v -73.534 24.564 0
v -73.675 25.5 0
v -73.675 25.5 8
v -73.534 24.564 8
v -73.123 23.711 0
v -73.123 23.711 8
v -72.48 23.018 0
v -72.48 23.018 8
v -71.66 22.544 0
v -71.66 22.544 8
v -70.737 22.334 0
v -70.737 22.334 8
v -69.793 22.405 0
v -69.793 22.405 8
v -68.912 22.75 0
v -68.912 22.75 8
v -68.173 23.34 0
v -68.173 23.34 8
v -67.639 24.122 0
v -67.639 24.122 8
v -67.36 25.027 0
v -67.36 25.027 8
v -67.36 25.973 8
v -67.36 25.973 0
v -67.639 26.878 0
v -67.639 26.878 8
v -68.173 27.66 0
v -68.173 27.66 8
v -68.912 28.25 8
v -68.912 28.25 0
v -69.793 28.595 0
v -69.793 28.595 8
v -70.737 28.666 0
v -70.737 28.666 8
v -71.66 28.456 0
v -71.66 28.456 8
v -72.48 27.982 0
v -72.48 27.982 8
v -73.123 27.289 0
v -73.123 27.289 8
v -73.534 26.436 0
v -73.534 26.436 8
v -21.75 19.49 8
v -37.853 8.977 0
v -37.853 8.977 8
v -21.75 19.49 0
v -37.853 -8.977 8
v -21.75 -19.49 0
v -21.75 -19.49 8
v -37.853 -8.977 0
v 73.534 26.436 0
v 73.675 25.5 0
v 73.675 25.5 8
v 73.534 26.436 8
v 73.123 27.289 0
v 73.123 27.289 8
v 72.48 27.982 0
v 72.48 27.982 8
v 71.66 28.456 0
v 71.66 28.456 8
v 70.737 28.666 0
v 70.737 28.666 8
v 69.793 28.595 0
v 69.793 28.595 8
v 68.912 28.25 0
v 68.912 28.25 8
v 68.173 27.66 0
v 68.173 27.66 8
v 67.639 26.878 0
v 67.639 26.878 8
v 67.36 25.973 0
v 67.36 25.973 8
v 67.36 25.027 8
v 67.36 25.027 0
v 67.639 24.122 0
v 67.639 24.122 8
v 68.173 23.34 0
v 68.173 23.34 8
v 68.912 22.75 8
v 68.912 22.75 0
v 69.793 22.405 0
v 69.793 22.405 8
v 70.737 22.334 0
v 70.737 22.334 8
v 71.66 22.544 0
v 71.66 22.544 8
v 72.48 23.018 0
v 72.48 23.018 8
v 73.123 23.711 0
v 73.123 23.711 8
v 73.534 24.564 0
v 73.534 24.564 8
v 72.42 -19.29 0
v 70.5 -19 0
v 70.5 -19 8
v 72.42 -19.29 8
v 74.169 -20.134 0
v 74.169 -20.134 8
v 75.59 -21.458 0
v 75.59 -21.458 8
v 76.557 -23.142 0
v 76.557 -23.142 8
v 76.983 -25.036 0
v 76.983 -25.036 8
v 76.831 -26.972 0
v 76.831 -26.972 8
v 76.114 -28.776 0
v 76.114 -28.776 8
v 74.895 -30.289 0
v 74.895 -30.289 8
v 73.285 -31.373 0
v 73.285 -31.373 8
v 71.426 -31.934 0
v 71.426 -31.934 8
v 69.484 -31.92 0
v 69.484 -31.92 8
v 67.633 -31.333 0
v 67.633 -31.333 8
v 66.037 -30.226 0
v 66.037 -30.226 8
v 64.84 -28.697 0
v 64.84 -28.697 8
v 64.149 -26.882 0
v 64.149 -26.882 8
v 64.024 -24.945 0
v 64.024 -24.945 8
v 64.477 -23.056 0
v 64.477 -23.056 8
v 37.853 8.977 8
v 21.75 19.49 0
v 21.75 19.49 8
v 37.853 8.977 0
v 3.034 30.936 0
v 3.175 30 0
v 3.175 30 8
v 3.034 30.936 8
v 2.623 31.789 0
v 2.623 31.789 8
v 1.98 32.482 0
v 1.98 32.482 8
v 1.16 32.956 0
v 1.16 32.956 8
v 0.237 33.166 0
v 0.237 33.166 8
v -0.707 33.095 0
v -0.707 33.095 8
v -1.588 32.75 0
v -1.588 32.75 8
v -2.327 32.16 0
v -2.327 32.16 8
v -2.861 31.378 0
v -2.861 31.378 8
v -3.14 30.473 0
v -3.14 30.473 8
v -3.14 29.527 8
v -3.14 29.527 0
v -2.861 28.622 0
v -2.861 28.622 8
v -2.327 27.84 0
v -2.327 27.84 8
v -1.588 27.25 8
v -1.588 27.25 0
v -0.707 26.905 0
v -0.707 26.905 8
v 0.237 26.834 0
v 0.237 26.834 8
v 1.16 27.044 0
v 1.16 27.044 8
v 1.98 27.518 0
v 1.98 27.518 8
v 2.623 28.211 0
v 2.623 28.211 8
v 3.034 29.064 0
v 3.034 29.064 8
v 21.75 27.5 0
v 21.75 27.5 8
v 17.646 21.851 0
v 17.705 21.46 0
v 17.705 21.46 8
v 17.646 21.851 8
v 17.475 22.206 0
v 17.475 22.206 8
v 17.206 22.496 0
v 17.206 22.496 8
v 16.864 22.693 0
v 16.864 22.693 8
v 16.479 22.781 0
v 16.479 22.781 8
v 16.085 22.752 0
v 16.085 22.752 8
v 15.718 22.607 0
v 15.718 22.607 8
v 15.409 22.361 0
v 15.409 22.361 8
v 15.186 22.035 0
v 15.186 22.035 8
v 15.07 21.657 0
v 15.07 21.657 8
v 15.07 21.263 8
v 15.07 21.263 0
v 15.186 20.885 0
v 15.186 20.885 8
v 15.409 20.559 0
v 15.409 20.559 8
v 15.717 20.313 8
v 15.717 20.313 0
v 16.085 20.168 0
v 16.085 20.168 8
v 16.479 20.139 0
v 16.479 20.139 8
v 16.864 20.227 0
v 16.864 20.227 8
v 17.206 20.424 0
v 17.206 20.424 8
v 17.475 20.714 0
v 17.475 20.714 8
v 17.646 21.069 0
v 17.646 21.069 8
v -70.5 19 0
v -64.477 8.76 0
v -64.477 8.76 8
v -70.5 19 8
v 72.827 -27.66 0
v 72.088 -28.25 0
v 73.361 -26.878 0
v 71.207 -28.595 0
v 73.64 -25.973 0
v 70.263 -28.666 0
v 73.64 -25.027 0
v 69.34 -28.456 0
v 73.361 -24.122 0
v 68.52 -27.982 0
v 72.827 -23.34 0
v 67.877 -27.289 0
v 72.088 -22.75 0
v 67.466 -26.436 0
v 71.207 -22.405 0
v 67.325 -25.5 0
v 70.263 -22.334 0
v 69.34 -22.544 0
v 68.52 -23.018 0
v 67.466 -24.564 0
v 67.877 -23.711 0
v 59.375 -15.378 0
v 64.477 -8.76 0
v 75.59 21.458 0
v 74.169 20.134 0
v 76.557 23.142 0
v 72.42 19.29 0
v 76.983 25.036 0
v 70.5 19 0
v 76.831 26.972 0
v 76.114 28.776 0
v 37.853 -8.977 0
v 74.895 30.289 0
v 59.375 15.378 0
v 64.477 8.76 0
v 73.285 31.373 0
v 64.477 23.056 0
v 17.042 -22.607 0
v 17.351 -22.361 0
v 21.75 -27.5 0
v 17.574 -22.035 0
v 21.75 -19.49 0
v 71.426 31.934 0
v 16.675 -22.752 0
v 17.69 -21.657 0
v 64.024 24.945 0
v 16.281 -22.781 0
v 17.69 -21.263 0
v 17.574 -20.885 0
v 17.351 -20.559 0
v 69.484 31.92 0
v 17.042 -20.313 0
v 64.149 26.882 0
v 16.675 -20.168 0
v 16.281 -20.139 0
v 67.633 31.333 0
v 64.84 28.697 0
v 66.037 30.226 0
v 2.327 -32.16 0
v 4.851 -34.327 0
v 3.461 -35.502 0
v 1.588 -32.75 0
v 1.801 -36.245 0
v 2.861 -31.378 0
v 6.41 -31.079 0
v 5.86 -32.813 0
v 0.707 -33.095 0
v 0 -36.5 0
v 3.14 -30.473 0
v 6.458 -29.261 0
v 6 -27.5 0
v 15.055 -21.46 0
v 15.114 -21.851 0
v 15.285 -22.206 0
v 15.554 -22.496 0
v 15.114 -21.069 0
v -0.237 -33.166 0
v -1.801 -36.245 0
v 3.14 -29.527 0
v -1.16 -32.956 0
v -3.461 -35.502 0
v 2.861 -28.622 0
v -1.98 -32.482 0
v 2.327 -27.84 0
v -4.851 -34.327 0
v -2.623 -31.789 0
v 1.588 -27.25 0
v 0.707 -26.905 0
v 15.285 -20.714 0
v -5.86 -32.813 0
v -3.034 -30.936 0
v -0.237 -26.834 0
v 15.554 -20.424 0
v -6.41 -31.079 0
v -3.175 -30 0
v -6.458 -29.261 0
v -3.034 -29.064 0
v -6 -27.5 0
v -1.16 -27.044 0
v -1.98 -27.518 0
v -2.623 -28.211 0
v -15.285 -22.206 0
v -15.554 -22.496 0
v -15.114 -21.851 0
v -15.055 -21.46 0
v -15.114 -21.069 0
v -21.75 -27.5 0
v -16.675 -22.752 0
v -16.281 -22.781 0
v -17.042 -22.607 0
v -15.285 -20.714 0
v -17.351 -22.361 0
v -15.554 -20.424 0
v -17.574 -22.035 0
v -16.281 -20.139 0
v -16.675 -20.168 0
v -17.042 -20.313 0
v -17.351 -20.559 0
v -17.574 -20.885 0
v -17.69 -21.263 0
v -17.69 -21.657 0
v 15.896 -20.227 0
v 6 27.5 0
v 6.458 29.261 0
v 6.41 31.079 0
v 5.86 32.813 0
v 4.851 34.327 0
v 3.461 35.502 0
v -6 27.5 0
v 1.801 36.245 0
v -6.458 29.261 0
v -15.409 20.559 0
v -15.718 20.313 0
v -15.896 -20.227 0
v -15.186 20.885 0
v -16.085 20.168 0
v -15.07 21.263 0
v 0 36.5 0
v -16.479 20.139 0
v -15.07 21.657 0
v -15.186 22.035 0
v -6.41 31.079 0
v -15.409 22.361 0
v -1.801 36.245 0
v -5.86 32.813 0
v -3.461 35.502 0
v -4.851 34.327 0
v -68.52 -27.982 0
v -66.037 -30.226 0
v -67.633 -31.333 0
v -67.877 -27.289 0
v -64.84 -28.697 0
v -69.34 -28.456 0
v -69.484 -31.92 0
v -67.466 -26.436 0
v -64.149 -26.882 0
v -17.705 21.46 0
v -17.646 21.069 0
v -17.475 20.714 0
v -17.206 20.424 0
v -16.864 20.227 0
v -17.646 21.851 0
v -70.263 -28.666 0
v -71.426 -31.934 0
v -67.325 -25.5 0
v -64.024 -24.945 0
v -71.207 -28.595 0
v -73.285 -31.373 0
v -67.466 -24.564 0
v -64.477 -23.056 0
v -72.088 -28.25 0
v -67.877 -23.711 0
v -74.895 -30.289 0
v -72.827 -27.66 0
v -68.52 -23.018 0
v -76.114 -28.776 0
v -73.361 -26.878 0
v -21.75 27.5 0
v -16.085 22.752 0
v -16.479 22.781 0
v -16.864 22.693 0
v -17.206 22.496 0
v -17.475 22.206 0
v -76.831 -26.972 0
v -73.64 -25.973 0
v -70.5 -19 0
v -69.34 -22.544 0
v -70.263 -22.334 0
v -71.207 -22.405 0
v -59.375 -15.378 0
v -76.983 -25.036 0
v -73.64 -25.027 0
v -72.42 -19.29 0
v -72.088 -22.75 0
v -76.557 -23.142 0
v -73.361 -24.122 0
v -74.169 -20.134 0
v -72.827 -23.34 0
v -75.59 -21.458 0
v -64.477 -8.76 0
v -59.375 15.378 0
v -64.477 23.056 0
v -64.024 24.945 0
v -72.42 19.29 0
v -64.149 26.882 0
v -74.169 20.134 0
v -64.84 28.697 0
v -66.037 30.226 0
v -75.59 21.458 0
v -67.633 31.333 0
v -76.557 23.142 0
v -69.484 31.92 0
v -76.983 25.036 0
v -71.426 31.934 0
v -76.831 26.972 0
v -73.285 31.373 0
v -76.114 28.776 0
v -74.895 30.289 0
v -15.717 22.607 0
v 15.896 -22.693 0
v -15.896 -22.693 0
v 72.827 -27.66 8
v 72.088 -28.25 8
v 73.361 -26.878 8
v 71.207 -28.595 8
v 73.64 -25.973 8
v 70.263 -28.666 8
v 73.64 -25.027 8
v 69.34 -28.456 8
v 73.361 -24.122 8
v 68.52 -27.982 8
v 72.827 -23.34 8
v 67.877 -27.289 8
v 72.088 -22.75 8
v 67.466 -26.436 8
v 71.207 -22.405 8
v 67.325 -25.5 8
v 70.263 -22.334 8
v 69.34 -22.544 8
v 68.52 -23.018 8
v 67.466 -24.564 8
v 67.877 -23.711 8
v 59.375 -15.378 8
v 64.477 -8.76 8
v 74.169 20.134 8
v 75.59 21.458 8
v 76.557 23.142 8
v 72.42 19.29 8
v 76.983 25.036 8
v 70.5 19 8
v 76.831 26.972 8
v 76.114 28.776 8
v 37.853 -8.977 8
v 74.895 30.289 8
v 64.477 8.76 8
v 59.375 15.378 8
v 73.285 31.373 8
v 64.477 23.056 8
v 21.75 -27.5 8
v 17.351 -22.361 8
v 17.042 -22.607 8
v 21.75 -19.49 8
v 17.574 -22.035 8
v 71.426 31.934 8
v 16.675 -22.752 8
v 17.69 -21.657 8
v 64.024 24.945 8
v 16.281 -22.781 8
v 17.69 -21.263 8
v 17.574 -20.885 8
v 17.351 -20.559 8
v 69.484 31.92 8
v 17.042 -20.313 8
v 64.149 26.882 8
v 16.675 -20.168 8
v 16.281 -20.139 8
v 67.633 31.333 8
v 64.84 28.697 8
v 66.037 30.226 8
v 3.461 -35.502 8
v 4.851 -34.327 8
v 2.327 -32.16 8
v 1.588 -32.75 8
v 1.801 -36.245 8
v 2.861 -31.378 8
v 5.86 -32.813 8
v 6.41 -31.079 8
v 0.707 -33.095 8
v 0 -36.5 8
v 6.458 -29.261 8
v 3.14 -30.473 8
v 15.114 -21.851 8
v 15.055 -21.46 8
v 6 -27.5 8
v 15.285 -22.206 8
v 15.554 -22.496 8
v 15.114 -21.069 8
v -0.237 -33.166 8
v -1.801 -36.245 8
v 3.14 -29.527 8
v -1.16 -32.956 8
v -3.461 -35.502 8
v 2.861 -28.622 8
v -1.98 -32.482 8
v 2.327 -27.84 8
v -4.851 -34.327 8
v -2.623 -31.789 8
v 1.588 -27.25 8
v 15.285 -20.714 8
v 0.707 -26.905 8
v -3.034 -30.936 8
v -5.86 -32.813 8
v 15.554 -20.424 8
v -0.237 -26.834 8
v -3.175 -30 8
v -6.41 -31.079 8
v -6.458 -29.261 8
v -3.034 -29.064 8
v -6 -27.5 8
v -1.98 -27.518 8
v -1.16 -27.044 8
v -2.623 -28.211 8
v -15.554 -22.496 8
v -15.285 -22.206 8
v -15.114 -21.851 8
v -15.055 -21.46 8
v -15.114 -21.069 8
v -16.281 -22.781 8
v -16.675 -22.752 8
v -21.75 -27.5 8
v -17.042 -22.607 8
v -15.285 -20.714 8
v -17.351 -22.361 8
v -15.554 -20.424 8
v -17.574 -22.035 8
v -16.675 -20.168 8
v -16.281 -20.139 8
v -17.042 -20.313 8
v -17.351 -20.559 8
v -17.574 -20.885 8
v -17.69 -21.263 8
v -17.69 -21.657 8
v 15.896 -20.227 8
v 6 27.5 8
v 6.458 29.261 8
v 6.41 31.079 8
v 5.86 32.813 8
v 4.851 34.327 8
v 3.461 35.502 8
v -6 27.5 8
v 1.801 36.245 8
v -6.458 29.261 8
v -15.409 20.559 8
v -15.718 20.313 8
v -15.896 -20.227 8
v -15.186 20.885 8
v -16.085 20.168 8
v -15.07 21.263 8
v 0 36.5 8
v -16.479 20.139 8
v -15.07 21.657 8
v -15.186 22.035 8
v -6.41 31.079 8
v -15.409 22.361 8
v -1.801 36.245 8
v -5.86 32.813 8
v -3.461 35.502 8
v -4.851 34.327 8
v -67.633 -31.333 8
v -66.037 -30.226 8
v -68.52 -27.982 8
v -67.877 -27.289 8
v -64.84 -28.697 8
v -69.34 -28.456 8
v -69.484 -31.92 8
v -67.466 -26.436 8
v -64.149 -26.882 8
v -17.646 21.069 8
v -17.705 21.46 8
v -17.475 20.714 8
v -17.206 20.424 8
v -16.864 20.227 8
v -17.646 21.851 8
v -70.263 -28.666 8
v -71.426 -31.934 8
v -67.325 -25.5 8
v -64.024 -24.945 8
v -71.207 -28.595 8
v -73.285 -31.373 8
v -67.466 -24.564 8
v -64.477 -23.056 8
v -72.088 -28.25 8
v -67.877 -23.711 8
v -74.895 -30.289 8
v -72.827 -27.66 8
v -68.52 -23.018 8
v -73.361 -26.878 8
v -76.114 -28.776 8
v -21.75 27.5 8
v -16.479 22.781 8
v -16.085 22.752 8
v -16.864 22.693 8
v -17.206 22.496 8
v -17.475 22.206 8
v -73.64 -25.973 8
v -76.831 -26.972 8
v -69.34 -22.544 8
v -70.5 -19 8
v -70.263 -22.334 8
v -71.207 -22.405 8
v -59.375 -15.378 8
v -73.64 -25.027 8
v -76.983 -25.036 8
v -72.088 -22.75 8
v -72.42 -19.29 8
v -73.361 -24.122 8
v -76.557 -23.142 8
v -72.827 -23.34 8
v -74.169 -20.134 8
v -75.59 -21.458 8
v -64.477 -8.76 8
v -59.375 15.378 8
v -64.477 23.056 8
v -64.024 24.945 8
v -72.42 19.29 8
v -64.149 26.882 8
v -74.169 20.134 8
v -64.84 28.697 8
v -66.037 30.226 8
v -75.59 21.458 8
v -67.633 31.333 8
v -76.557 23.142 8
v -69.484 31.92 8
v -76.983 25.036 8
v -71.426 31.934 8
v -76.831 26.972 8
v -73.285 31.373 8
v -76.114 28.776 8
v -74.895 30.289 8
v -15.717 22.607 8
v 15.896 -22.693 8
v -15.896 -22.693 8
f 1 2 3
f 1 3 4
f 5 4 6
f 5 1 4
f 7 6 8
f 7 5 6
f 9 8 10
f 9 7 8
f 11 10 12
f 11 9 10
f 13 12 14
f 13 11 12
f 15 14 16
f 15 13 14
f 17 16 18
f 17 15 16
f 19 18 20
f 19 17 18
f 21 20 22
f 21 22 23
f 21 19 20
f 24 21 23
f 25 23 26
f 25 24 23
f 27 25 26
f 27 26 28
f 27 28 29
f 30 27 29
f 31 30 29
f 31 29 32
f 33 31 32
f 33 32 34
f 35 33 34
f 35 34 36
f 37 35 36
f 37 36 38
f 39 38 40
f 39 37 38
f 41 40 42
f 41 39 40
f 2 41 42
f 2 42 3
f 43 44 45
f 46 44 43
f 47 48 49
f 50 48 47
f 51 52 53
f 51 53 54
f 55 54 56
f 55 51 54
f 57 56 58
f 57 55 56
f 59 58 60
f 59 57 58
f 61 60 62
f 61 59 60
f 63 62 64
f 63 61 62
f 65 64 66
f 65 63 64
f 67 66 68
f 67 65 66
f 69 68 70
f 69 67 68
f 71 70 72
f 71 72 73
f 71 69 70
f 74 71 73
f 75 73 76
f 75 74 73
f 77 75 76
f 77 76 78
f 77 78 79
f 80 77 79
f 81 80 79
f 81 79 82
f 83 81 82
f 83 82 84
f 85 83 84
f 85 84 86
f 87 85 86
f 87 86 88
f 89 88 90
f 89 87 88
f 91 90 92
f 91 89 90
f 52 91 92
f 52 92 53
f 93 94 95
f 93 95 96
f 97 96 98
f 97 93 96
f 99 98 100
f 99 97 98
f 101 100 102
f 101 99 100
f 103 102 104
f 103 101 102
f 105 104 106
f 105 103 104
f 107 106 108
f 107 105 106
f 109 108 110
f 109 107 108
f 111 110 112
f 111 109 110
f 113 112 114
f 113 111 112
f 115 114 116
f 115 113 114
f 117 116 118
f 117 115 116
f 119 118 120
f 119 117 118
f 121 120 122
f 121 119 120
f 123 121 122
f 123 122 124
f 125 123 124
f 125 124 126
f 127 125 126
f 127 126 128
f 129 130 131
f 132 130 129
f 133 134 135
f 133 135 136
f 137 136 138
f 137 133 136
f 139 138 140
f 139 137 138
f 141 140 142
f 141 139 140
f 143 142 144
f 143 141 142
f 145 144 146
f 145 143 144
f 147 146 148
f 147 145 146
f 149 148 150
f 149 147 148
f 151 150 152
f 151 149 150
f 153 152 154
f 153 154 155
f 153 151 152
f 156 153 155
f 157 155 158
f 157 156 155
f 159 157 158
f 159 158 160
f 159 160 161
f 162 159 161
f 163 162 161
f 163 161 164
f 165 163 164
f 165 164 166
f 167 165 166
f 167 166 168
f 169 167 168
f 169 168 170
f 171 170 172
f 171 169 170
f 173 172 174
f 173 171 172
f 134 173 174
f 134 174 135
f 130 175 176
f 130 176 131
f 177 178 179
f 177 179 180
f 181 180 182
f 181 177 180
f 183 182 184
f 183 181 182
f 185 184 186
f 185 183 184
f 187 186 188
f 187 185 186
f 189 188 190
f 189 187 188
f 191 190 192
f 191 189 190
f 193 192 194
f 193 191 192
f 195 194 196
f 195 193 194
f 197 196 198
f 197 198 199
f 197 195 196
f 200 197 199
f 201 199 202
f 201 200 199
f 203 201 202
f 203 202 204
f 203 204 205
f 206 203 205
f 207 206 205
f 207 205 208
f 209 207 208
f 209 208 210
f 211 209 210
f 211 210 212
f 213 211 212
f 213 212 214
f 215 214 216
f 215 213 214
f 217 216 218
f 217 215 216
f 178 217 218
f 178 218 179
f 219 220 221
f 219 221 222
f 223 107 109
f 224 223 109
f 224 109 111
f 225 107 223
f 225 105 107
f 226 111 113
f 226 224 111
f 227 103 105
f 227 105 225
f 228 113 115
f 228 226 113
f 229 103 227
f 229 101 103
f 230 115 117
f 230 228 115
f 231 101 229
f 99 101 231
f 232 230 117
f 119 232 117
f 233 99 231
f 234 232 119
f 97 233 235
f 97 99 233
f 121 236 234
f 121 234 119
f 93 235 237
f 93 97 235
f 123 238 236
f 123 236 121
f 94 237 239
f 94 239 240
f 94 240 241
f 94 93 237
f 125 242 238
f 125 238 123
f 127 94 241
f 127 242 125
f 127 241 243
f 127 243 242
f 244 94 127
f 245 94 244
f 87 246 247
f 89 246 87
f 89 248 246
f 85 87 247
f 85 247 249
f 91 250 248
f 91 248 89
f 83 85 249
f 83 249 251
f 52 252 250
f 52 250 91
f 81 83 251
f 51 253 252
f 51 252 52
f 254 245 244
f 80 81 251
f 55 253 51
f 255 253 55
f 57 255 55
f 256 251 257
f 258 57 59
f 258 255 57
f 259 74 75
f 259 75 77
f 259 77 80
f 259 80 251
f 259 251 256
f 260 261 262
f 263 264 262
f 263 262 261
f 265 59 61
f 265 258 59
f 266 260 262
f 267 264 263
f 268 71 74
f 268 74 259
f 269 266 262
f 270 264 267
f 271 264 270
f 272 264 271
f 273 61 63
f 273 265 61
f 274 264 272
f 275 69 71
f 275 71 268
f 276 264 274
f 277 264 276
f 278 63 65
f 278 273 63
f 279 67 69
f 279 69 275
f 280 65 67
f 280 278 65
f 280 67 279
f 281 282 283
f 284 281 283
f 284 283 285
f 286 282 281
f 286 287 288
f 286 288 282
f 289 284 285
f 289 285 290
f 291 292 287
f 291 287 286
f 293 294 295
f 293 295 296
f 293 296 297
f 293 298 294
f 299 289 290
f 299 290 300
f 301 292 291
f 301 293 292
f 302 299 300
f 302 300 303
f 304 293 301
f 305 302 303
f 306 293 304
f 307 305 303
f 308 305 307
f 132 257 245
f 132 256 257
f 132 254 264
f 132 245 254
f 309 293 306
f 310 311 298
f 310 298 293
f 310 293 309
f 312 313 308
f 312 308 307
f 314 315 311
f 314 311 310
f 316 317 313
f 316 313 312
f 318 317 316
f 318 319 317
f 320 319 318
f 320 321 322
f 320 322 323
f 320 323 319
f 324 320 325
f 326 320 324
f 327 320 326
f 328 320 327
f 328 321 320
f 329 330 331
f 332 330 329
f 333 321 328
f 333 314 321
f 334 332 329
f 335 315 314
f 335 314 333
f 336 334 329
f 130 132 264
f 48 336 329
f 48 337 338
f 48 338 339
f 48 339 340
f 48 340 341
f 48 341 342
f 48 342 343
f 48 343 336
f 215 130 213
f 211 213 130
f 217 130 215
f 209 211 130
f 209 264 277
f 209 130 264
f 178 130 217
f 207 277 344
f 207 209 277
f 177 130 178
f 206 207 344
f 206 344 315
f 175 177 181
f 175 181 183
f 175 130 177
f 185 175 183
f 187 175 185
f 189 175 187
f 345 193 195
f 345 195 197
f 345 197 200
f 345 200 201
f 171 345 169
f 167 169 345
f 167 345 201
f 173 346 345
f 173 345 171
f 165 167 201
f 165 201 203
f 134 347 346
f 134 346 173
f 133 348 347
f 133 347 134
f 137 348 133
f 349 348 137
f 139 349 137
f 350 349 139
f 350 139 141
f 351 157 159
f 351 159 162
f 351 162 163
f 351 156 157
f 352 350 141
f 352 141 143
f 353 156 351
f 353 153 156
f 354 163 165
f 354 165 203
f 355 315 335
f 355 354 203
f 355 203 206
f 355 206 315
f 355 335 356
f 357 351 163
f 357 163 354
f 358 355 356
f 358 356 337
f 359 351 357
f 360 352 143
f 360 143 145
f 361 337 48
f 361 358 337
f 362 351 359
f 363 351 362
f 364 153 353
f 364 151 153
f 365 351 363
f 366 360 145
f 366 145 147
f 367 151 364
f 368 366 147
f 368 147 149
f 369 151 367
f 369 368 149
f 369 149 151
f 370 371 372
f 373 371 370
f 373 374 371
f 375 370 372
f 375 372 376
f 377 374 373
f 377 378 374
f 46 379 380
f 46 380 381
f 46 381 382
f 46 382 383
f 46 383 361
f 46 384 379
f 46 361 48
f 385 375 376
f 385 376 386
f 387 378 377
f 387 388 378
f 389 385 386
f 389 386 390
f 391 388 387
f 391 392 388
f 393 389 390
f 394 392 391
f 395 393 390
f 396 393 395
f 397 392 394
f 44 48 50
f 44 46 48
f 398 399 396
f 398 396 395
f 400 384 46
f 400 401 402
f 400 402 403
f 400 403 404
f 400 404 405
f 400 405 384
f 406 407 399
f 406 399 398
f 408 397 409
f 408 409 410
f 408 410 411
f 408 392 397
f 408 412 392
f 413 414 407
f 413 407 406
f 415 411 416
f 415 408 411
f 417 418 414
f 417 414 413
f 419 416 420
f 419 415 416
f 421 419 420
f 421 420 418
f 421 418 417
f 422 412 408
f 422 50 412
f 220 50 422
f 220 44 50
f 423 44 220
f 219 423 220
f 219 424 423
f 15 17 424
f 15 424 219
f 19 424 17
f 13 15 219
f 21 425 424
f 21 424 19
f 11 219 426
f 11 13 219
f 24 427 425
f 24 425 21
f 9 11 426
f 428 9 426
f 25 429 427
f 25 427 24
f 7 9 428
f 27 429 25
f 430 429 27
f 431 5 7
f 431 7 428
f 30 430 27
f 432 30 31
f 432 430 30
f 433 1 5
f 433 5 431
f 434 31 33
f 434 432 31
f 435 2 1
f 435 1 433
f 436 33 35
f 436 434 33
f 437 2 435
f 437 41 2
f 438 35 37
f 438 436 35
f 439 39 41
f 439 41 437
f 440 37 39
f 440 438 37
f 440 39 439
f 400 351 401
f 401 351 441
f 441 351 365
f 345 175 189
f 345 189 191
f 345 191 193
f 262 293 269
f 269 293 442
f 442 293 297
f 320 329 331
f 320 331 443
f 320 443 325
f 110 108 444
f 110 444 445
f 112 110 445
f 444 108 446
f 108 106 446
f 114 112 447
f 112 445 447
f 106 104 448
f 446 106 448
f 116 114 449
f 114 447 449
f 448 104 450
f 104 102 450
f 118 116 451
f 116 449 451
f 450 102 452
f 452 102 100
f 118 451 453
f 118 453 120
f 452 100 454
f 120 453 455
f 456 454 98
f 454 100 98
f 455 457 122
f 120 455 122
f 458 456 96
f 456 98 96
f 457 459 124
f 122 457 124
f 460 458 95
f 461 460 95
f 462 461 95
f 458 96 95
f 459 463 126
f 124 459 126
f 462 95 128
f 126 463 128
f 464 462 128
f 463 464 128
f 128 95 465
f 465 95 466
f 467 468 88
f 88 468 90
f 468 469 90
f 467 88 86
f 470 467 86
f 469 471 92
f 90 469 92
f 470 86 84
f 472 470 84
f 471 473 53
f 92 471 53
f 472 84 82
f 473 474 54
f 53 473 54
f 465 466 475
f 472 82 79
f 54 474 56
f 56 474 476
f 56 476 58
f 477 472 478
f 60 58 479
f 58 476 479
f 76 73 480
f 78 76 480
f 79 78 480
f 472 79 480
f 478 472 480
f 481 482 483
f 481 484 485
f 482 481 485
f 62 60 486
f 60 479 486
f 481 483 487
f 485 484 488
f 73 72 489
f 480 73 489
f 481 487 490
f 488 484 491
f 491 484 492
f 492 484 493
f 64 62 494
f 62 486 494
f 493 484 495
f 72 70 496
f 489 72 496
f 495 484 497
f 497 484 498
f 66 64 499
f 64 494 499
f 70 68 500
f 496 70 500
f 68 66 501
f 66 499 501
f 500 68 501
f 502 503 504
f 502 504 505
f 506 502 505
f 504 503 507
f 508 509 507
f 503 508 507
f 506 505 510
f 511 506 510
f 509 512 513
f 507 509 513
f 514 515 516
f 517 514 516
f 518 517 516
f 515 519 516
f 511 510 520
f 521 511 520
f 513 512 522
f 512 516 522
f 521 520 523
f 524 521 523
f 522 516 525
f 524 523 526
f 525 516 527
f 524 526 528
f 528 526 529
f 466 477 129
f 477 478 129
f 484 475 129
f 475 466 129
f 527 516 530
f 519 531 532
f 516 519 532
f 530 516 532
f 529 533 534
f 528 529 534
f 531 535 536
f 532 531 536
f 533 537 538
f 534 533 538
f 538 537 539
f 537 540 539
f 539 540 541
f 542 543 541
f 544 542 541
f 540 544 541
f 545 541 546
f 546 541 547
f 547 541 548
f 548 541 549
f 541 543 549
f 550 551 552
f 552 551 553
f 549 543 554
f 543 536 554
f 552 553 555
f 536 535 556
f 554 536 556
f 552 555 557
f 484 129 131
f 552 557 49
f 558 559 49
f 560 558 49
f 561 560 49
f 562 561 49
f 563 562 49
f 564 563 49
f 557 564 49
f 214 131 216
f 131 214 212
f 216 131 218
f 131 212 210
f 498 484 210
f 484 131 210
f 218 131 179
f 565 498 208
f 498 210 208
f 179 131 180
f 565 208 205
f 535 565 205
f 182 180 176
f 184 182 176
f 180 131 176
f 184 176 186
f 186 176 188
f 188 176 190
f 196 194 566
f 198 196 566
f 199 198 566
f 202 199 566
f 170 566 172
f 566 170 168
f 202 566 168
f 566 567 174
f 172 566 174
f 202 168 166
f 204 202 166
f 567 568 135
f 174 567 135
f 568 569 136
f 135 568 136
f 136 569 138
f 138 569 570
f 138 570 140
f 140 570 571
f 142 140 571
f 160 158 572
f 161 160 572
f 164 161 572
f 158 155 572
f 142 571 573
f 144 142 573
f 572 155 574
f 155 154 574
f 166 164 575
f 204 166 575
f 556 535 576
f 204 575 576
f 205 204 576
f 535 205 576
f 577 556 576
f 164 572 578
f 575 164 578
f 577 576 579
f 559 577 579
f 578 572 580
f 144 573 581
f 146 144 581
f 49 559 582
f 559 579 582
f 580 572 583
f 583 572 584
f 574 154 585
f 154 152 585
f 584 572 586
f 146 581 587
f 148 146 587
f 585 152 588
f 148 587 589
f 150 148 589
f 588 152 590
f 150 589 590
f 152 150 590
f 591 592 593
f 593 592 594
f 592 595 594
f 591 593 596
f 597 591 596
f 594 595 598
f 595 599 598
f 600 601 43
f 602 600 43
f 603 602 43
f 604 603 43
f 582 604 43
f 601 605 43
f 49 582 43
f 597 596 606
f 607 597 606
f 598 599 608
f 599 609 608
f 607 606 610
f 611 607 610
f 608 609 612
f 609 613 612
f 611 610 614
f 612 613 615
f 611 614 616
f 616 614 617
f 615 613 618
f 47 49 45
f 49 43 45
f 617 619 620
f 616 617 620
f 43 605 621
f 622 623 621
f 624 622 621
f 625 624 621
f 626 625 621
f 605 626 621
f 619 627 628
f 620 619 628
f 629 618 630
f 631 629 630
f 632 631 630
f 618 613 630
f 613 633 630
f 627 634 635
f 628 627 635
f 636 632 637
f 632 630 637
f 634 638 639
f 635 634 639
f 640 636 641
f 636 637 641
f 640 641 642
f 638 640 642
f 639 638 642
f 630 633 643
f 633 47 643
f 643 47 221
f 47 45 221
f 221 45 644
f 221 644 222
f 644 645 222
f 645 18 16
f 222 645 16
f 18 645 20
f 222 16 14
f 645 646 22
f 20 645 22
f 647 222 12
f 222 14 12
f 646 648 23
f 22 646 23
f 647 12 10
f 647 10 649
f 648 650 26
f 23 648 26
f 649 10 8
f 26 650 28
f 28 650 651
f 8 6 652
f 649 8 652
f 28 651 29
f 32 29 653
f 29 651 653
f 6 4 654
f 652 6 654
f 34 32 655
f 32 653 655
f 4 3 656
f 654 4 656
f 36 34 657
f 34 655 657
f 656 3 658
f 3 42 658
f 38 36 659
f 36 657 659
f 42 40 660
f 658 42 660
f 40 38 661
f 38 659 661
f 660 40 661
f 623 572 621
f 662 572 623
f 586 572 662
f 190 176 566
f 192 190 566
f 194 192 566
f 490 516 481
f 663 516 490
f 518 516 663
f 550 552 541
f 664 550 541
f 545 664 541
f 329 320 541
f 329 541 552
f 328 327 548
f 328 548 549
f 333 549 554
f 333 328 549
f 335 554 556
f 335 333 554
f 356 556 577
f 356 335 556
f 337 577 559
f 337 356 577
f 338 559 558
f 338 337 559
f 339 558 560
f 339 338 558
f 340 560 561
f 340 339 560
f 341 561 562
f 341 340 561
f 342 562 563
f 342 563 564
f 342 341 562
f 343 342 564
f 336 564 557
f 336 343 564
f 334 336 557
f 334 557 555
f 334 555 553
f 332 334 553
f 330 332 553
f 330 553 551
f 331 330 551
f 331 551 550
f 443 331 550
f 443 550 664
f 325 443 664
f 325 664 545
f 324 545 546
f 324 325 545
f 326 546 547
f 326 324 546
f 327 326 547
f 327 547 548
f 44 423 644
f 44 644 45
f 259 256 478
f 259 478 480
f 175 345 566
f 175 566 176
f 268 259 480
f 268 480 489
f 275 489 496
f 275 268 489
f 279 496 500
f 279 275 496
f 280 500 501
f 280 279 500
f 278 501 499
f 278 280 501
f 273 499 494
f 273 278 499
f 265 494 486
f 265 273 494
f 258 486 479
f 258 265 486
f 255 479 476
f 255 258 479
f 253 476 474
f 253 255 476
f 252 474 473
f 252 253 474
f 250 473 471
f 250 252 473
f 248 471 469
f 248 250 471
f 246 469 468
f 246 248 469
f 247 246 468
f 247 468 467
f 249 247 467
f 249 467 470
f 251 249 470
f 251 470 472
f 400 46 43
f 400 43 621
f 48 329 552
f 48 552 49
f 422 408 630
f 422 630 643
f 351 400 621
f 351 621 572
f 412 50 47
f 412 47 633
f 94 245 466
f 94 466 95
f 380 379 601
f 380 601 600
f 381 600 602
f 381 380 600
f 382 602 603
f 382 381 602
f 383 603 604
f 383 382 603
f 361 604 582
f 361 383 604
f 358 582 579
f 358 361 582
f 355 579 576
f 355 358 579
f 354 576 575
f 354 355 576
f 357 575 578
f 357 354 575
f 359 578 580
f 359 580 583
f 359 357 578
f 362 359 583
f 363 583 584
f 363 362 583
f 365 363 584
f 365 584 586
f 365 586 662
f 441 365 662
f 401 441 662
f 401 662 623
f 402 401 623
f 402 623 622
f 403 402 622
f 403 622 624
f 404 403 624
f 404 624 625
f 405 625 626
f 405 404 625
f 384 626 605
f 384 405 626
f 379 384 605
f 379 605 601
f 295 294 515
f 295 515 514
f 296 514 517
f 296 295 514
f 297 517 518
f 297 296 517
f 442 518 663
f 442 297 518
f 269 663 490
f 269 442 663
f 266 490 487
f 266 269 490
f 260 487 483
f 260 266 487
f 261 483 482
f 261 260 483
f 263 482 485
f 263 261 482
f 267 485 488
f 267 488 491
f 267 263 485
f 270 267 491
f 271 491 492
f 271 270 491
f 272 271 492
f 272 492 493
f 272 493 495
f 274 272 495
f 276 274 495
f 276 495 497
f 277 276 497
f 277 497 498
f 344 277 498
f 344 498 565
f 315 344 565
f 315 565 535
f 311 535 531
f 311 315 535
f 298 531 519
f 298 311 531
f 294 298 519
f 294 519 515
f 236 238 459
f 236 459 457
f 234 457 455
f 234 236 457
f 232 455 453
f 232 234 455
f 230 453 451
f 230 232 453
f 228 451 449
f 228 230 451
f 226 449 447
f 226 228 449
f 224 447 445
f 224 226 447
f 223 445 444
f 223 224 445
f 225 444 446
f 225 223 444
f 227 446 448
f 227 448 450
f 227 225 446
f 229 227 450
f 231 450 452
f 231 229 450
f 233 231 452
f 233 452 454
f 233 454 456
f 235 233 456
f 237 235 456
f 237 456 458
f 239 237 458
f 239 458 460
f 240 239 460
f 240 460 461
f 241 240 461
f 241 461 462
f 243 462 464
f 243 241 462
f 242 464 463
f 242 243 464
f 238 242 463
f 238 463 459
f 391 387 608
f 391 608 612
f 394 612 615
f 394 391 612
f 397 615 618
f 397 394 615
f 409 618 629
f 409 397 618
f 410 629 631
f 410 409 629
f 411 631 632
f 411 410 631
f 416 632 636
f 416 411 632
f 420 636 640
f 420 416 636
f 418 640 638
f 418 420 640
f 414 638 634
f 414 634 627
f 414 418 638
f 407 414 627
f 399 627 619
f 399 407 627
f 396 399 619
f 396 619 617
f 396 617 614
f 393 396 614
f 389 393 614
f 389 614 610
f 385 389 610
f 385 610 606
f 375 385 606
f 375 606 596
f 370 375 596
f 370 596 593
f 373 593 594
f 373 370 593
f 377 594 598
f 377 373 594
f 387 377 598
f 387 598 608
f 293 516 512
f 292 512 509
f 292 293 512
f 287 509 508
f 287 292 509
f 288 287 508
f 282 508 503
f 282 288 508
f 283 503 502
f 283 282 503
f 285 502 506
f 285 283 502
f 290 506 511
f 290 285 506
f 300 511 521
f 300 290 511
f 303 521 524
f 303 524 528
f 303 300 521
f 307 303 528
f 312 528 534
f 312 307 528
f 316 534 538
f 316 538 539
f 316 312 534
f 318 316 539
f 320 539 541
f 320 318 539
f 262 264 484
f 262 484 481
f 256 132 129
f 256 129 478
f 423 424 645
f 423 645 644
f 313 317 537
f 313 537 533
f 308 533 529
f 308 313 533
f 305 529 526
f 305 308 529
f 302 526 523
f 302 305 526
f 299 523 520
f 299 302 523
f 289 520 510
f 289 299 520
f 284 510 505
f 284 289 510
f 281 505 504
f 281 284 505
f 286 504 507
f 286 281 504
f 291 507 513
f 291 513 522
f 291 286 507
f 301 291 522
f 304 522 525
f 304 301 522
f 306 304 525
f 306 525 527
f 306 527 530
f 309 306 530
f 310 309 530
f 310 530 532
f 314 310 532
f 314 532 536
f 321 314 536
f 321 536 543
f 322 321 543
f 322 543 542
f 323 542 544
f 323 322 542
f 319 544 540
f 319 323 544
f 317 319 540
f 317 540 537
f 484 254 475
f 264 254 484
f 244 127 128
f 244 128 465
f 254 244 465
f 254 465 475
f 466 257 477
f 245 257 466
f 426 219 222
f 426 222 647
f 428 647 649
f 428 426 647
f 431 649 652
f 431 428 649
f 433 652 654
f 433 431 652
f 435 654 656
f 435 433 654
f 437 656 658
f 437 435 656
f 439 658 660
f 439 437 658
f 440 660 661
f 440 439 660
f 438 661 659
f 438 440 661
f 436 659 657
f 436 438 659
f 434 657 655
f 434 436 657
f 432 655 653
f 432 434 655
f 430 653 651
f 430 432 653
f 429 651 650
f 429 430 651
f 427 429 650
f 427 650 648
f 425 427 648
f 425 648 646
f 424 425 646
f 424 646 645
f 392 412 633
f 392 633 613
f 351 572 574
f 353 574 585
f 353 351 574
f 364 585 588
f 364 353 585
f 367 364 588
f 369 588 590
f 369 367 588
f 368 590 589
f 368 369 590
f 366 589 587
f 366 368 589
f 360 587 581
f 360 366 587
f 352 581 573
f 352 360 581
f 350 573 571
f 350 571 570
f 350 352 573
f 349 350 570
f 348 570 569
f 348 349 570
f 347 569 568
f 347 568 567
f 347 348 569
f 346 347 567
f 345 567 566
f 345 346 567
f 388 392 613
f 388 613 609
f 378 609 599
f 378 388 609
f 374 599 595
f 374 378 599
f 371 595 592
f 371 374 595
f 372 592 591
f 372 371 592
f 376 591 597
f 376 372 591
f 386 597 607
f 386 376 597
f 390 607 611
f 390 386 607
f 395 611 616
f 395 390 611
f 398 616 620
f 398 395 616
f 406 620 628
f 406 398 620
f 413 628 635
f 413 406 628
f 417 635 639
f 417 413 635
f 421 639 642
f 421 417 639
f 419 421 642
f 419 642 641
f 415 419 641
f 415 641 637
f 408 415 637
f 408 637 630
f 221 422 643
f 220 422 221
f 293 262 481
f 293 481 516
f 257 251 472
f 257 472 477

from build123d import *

# Parameters (mm, degrees)
SKETCH1_R           = 3.175
SKETCH1_R_2         = 1.325
BOSS_EXTRUDE1_DEPTH = 8


with BuildPart() as part:
    # Sketch1 → Boss-Extrude1 (new body)
    with BuildSketch(Plane.XY):
        with BuildLine():
            Line((-21.75, 27.5), (-6, 27.5))
            ThreePointArc((-6, 27.5), (0, 36.5), (6, 27.5))
            Line((6, 27.5), (21.75, 27.5))
            Line((21.75, 27.5), (21.75, 19.489664619))
            Line((21.75, 19.489664619), (37.852514493, 8.977148354))
            Line((37.852514493, 8.977148354), (59.375273358, 15.378390657))
            Line((59.375273358, 15.378390657), (64.476863532, 23.056267795))
            ThreePointArc((64.476863532, 23.056267795), (74.130822267, 30.891394037), (70.5, 19))
            Line((70.5, 19), (64.476863532, 8.759983115))
            Line((64.476863532, 8.759983115), (64.476863532, -8.759983115))
            Line((64.476863532, -8.759983115), (70.5, -19))
            ThreePointArc((70.5, -19), (74.130822267, -30.891394037), (64.476863532, -23.056267795))
            Line((64.476863532, -23.056267795), (59.375273358, -15.378390657))
            Line((59.375273358, -15.378390657), (37.852514493, -8.977148354))
            Line((37.852514493, -8.977148354), (21.75, -19.489664619))
            Line((21.75, -19.489664619), (21.75, -27.5))
            Line((21.75, -27.5), (6, -27.5))
            ThreePointArc((6, -27.5), (0, -36.5), (-6, -27.5))
            Line((-6, -27.5), (-21.75, -27.5))
            Line((-21.75, -27.5), (-21.75, -19.489664619))
            Line((-21.75, -19.489664619), (-37.852514493, -8.977148354))
            Line((-37.852514493, -8.977148354), (-59.375273358, -15.378390657))
            Line((-59.375273358, -15.378390657), (-64.476863532, -23.056267795))
            ThreePointArc((-64.476863532, -23.056267795), (-74.130822267, -30.891394037), (-70.5, -19))
            Line((-70.5, -19), (-64.476863532, -8.759983115))
            Line((-64.476863532, -8.759983115), (-64.476863532, 8.759983115))
            Line((-64.476863532, 8.759983115), (-70.5, 19))
            ThreePointArc((-70.5, 19), (-74.130822267, 30.891394037), (-64.476863532, 23.056267795))
            Line((-64.476863532, 23.056267795), (-59.375273358, 15.378390657))
            Line((-59.375273358, 15.378390657), (-37.852514493, 8.977148354))
            Line((-37.852514493, 8.977148354), (-21.75, 19.489664619))
            Line((-21.75, 19.489664619), (-21.75, 27.5))
        make_face()
        with Locations((0, 30)):
            Circle(SKETCH1_R, mode=Mode.SUBTRACT)
        with Locations((70.5, 25.5)):
            Circle(SKETCH1_R, mode=Mode.SUBTRACT)
        with Locations(Location((70.5, -25.5, 0), (0, 0, 180))):
            Circle(SKETCH1_R, mode=Mode.SUBTRACT)
        with Locations(Location((0, -30, 0), (0, 0, 180))):
            Circle(SKETCH1_R, mode=Mode.SUBTRACT)
        with Locations((-70.5, -25.5)):
            Circle(SKETCH1_R, mode=Mode.SUBTRACT)
        with Locations(Location((-70.5, 25.5, 0), (0, 0, 180))):
            Circle(SKETCH1_R, mode=Mode.SUBTRACT)
        with Locations((16.38, 21.46)):
            Circle(SKETCH1_R_2, mode=Mode.SUBTRACT)
        with Locations(Location((-16.38, 21.46, 0), (0, 0, 180))):
            Circle(SKETCH1_R_2, mode=Mode.SUBTRACT)
        with Locations((-16.38, -21.46)):
            Circle(SKETCH1_R_2, mode=Mode.SUBTRACT)
        with Locations(Location((16.38, -21.46, 0), (0, 0, 180))):
            Circle(SKETCH1_R_2, mode=Mode.SUBTRACT)
    extrude(amount=BOSS_EXTRUDE1_DEPTH)


solid = part.part
